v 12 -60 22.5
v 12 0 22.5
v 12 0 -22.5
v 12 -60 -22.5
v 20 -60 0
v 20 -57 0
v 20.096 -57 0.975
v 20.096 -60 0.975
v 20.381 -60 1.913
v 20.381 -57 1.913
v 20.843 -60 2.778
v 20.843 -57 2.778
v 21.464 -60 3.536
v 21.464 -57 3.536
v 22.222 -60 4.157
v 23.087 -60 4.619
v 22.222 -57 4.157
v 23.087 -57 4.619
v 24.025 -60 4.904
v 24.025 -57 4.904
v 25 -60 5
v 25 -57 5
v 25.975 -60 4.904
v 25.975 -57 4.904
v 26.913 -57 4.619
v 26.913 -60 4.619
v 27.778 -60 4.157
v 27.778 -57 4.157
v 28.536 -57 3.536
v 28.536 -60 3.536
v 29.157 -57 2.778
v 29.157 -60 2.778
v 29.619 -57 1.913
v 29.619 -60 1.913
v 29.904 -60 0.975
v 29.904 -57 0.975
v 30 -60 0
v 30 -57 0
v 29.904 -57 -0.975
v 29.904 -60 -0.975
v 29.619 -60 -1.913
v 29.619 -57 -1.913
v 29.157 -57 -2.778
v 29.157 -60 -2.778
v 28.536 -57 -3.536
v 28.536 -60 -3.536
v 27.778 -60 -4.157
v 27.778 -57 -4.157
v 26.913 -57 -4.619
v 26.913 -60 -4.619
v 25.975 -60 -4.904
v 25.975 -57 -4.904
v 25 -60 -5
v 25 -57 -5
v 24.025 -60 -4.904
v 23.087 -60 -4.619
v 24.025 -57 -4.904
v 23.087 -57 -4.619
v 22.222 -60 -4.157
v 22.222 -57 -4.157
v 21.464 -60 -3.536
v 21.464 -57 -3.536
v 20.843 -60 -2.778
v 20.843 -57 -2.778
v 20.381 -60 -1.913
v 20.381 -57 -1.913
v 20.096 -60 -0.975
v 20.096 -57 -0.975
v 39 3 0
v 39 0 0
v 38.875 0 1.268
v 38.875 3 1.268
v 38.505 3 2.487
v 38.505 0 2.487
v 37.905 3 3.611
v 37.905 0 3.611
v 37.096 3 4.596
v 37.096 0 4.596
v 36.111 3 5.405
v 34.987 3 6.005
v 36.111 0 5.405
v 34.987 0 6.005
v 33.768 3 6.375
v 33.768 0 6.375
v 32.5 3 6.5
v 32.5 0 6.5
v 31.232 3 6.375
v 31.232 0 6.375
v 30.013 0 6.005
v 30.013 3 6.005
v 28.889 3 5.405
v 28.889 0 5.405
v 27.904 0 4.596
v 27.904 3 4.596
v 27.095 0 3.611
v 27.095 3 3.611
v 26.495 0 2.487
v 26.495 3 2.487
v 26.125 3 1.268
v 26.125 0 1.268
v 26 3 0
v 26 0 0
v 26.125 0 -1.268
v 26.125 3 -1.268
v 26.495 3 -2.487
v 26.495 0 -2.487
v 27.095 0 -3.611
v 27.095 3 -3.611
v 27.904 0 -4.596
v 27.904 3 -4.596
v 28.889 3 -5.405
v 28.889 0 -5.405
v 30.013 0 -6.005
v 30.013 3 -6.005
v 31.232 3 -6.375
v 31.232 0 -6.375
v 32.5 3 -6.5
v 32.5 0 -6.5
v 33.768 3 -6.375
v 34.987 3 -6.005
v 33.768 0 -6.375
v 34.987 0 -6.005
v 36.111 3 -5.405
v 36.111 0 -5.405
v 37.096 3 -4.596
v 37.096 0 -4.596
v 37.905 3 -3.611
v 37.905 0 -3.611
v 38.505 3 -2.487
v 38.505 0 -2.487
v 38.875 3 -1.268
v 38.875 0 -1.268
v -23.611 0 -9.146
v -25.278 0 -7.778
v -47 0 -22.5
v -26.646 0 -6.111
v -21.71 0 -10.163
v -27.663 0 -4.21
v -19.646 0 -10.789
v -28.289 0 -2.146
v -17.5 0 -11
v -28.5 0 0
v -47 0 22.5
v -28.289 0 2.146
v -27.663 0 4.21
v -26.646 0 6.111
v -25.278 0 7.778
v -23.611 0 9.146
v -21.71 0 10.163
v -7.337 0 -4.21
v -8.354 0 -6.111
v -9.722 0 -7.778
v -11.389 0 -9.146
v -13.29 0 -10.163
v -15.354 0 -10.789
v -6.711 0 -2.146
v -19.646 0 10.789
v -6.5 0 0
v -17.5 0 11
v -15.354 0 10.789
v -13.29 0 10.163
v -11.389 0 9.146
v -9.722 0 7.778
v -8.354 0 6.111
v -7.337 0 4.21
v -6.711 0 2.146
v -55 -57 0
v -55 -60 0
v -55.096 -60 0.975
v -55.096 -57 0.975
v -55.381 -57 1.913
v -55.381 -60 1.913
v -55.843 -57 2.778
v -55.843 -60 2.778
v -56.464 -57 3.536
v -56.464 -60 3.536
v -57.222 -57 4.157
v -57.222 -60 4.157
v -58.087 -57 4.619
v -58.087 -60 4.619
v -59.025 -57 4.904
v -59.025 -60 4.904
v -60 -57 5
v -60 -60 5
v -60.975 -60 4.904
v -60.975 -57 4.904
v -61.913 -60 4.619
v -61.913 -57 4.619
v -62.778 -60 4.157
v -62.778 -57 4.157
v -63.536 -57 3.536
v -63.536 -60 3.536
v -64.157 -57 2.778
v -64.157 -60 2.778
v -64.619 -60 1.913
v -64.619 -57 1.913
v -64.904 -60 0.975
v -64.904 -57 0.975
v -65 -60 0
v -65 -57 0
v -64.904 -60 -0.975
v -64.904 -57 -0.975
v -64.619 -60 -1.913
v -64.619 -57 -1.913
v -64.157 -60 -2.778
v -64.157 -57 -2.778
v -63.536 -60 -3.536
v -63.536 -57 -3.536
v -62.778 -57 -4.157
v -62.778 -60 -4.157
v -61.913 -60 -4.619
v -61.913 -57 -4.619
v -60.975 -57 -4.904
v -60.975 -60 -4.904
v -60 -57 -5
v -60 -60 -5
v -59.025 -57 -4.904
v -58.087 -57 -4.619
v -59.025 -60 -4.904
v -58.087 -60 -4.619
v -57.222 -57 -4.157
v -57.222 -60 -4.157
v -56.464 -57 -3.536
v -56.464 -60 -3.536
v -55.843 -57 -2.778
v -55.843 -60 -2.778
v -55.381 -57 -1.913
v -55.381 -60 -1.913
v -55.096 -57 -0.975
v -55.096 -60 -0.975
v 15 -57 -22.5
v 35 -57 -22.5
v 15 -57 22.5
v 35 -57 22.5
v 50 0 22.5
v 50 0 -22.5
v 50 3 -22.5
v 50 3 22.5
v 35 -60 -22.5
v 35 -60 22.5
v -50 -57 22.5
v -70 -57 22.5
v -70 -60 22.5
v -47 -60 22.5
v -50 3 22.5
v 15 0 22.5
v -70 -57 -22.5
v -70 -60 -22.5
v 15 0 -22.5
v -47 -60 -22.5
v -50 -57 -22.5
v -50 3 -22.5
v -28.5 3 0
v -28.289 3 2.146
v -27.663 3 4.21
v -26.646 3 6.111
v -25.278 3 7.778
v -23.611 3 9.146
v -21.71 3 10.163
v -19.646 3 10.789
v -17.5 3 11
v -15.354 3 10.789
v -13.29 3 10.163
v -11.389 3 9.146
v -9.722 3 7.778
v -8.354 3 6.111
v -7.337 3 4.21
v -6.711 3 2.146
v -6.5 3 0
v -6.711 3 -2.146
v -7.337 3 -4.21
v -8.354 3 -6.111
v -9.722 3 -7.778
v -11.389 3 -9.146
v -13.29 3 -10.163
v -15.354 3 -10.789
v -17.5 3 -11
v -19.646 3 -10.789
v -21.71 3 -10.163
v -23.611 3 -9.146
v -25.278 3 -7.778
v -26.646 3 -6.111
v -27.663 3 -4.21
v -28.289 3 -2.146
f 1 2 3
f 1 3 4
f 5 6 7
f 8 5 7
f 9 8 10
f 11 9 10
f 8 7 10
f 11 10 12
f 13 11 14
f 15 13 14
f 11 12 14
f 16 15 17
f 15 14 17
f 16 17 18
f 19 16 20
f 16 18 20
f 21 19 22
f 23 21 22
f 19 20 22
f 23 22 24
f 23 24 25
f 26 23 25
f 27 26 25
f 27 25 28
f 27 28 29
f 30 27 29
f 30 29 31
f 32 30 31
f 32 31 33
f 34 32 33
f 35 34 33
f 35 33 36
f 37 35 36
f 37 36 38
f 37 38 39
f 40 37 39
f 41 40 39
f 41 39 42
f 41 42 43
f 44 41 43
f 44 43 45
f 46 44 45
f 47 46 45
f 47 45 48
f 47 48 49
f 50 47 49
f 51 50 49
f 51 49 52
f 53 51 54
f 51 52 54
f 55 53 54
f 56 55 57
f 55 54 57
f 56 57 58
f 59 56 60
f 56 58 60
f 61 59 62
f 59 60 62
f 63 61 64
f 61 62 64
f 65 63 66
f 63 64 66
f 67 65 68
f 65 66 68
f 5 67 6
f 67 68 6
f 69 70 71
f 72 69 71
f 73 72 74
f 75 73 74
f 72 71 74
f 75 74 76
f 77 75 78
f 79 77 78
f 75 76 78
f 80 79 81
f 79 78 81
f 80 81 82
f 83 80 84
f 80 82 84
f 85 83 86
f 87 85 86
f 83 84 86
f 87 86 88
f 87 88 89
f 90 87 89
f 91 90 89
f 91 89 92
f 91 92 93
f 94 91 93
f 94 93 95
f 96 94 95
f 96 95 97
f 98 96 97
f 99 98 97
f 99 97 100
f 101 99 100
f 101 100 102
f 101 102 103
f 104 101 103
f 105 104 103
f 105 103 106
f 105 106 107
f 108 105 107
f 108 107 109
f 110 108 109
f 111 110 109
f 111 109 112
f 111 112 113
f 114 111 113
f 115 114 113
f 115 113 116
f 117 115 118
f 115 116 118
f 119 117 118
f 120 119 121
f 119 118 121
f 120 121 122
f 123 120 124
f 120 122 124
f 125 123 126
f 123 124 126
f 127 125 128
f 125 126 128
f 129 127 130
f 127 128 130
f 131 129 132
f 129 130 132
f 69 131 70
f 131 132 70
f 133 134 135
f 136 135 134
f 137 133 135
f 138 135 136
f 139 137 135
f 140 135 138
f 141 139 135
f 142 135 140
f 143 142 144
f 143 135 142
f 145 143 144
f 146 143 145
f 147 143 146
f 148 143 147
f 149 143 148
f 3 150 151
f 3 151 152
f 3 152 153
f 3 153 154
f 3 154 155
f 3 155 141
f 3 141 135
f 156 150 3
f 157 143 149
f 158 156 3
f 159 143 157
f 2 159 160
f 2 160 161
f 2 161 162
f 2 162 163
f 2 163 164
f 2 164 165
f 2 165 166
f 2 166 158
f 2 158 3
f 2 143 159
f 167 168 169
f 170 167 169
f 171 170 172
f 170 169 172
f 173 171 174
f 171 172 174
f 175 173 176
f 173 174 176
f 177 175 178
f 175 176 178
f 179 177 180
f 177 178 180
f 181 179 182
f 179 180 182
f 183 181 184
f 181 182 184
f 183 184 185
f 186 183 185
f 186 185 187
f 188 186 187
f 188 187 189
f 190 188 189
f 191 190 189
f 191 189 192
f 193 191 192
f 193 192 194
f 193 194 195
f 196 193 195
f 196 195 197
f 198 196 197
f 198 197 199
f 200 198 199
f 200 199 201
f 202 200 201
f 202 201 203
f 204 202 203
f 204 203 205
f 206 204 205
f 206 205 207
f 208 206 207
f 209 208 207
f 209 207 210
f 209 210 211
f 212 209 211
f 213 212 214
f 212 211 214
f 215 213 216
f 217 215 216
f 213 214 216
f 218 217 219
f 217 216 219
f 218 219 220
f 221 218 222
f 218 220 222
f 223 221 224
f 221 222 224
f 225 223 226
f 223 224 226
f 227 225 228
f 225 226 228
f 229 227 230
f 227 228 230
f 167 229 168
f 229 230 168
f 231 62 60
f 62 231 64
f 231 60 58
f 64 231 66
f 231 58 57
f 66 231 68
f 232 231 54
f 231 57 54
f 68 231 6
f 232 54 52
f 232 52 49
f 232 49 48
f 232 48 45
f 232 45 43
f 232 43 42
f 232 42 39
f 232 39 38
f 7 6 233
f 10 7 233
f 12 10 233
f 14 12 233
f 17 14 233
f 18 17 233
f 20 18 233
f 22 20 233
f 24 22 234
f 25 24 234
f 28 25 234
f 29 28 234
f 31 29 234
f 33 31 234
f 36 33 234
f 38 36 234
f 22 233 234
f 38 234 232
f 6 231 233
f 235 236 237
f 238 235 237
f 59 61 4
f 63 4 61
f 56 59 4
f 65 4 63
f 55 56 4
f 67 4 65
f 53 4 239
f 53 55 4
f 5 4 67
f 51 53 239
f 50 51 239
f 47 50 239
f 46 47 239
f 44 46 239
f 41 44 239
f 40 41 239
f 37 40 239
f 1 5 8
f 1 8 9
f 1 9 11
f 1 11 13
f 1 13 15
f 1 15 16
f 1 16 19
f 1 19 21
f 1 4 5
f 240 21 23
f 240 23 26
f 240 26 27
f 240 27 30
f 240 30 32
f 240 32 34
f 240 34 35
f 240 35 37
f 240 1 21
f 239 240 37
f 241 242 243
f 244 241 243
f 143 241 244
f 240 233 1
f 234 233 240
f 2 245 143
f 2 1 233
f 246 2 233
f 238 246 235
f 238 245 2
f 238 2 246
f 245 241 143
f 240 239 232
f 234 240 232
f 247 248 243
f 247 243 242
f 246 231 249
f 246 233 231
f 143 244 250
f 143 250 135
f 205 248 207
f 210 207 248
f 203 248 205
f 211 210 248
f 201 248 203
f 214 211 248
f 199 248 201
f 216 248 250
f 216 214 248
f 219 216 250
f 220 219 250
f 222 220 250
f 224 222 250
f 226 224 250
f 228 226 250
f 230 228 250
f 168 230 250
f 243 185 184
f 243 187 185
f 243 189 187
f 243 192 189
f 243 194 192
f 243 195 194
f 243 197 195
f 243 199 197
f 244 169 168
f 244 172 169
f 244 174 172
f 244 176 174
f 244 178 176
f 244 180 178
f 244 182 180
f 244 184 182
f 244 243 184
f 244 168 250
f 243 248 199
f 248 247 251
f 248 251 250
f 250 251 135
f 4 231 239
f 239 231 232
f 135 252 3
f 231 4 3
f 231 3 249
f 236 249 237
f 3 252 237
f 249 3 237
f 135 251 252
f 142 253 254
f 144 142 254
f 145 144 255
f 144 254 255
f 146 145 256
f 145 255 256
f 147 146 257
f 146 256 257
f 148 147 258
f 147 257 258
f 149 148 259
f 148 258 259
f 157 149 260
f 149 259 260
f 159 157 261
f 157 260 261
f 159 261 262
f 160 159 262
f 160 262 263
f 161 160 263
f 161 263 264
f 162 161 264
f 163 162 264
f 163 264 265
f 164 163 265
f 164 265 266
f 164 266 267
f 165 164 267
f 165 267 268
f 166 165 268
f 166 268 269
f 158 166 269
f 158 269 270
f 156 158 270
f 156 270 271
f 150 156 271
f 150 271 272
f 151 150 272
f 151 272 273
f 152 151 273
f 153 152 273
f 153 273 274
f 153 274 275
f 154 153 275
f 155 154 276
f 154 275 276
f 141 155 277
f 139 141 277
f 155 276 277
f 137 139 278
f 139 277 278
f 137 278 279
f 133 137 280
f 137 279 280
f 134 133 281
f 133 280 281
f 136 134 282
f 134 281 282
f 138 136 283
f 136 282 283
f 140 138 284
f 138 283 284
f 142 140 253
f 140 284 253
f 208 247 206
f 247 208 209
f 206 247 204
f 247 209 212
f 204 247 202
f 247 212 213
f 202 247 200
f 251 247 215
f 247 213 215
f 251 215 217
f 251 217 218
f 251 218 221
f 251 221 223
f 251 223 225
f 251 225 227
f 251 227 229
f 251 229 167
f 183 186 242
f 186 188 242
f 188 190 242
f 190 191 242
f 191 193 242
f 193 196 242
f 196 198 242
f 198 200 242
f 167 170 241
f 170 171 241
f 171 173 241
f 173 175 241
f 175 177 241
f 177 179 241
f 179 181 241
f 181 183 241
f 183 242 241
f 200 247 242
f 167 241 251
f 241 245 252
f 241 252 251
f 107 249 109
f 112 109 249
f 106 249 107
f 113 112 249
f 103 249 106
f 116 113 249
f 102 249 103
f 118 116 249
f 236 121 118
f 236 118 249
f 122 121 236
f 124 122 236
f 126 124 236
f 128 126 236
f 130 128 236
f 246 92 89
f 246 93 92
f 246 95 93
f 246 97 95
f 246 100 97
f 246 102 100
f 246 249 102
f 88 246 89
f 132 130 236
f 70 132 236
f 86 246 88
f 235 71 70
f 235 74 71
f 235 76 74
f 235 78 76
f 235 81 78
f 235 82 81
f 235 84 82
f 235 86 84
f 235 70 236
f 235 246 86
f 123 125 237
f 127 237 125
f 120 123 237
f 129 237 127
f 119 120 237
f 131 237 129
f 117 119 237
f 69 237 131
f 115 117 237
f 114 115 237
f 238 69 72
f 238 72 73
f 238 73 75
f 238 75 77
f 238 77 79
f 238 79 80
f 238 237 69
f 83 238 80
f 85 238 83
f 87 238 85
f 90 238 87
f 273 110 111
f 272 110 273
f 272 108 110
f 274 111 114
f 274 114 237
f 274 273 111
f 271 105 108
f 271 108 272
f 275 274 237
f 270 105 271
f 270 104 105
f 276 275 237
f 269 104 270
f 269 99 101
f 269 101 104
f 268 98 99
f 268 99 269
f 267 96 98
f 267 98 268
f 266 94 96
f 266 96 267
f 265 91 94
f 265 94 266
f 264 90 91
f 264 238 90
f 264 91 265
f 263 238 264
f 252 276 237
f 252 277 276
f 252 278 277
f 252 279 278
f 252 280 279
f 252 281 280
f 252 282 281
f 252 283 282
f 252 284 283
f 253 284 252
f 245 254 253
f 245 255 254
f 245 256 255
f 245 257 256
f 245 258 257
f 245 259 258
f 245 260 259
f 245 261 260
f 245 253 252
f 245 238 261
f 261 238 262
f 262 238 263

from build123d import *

# Parameters (mm, degrees)
F0_W           = 20
F0_H           = 3
F2_DEPTH       = 22.5
F3_D           = 13
F3_DEPTH       = 10
F3_TIP         = 3.9055940237
F4_D           = 22
F4_DEPTH       = 10
F4_TIP         = 6.6094668093
F7_D           = 10
F7_DEPTH       = 10
F7_TIP         = 3.0043030951
F7_ON_F5_D     = 10
F7_ON_F5_DEPTH = 10
F7_ON_F5_TIP   = 3.0043030951


# Not quite as in the source:
# - a feature names something its author has since deleted; it is built from what else it names


with BuildPart() as f2:
    # F0 (on Top) → F2 (new body, symmetric)
    with BuildSketch(Plane.XY):
        Polygon((-47, 0), (0, 0), (12, 0), (15, 0), (50, 0), (50, 3), (-50, 3), (-50, 0), align=None)
        Polygon((15, 0), (12, 0), (12, -60), (15, -60), (15, -57), align=None)
        Polygon((-47, -60), (-47, 0), (-50, 0), (-50, -57), (-50, -60), align=None)
        with Locations((-60, -58.5)):
            Rectangle(F0_W, F0_H)
        with Locations((25, -58.5)):
            Rectangle(F0_W, F0_H)
    extrude(amount=F2_DEPTH, both=True)

    # F3 (one way)
    with BuildSketch(Plane.XZ):
        with Locations((32.5, 0)):
            Circle(F3_D / 2)
    extrude(amount=-F3_DEPTH, mode=Mode.SUBTRACT)
    with Locations(Plane.XZ):
        with Locations((32.5, 0)):
            with Locations((0, 0, -(F3_DEPTH + F3_TIP / 2))):  # 118° drill point
                Cone(0, F3_D / 2, F3_TIP, mode=Mode.SUBTRACT)

    # F4
    with Locations(Plane.XZ):
        with Locations((-17.5, 0)):
            Hole(F4_D / 2, depth=F4_DEPTH)
            with Locations((0, 0, -(F4_DEPTH + F4_TIP / 2))):  # 118° drill point
                Cone(0, F4_D / 2, F4_TIP, mode=Mode.SUBTRACT)

    # F7 (one way)
    with BuildSketch(Plane(origin=(0, -57, 0), x_dir=(-1, 0, 0), z_dir=(0, 1, 0))):
        with Locations((-25, 0)):
            Circle(F7_D / 2)
    extrude(amount=-F7_DEPTH, mode=Mode.SUBTRACT)
    with Locations(Plane(origin=(0, -57, 0), x_dir=(-1, 0, 0), z_dir=(0, 1, 0))):
        with Locations((-25, 0)):
            with Locations((0, 0, -(F7_DEPTH + F7_TIP / 2))):  # 118° drill point
                Cone(0, F7_D / 2, F7_TIP, mode=Mode.SUBTRACT)

    # F7 on F5
    with Locations(Plane(origin=(0, -57, 0), x_dir=(-1, 0, 0), z_dir=(0, 1, 0))):
        with Locations((60, 0)):
            Hole(F7_ON_F5_D / 2, depth=F7_ON_F5_DEPTH)
            with Locations((0, 0, -(F7_ON_F5_DEPTH + F7_ON_F5_TIP / 2))):  # 118° drill point
                Cone(0, F7_ON_F5_D / 2, F7_ON_F5_TIP, mode=Mode.SUBTRACT)


solid = f2.part
